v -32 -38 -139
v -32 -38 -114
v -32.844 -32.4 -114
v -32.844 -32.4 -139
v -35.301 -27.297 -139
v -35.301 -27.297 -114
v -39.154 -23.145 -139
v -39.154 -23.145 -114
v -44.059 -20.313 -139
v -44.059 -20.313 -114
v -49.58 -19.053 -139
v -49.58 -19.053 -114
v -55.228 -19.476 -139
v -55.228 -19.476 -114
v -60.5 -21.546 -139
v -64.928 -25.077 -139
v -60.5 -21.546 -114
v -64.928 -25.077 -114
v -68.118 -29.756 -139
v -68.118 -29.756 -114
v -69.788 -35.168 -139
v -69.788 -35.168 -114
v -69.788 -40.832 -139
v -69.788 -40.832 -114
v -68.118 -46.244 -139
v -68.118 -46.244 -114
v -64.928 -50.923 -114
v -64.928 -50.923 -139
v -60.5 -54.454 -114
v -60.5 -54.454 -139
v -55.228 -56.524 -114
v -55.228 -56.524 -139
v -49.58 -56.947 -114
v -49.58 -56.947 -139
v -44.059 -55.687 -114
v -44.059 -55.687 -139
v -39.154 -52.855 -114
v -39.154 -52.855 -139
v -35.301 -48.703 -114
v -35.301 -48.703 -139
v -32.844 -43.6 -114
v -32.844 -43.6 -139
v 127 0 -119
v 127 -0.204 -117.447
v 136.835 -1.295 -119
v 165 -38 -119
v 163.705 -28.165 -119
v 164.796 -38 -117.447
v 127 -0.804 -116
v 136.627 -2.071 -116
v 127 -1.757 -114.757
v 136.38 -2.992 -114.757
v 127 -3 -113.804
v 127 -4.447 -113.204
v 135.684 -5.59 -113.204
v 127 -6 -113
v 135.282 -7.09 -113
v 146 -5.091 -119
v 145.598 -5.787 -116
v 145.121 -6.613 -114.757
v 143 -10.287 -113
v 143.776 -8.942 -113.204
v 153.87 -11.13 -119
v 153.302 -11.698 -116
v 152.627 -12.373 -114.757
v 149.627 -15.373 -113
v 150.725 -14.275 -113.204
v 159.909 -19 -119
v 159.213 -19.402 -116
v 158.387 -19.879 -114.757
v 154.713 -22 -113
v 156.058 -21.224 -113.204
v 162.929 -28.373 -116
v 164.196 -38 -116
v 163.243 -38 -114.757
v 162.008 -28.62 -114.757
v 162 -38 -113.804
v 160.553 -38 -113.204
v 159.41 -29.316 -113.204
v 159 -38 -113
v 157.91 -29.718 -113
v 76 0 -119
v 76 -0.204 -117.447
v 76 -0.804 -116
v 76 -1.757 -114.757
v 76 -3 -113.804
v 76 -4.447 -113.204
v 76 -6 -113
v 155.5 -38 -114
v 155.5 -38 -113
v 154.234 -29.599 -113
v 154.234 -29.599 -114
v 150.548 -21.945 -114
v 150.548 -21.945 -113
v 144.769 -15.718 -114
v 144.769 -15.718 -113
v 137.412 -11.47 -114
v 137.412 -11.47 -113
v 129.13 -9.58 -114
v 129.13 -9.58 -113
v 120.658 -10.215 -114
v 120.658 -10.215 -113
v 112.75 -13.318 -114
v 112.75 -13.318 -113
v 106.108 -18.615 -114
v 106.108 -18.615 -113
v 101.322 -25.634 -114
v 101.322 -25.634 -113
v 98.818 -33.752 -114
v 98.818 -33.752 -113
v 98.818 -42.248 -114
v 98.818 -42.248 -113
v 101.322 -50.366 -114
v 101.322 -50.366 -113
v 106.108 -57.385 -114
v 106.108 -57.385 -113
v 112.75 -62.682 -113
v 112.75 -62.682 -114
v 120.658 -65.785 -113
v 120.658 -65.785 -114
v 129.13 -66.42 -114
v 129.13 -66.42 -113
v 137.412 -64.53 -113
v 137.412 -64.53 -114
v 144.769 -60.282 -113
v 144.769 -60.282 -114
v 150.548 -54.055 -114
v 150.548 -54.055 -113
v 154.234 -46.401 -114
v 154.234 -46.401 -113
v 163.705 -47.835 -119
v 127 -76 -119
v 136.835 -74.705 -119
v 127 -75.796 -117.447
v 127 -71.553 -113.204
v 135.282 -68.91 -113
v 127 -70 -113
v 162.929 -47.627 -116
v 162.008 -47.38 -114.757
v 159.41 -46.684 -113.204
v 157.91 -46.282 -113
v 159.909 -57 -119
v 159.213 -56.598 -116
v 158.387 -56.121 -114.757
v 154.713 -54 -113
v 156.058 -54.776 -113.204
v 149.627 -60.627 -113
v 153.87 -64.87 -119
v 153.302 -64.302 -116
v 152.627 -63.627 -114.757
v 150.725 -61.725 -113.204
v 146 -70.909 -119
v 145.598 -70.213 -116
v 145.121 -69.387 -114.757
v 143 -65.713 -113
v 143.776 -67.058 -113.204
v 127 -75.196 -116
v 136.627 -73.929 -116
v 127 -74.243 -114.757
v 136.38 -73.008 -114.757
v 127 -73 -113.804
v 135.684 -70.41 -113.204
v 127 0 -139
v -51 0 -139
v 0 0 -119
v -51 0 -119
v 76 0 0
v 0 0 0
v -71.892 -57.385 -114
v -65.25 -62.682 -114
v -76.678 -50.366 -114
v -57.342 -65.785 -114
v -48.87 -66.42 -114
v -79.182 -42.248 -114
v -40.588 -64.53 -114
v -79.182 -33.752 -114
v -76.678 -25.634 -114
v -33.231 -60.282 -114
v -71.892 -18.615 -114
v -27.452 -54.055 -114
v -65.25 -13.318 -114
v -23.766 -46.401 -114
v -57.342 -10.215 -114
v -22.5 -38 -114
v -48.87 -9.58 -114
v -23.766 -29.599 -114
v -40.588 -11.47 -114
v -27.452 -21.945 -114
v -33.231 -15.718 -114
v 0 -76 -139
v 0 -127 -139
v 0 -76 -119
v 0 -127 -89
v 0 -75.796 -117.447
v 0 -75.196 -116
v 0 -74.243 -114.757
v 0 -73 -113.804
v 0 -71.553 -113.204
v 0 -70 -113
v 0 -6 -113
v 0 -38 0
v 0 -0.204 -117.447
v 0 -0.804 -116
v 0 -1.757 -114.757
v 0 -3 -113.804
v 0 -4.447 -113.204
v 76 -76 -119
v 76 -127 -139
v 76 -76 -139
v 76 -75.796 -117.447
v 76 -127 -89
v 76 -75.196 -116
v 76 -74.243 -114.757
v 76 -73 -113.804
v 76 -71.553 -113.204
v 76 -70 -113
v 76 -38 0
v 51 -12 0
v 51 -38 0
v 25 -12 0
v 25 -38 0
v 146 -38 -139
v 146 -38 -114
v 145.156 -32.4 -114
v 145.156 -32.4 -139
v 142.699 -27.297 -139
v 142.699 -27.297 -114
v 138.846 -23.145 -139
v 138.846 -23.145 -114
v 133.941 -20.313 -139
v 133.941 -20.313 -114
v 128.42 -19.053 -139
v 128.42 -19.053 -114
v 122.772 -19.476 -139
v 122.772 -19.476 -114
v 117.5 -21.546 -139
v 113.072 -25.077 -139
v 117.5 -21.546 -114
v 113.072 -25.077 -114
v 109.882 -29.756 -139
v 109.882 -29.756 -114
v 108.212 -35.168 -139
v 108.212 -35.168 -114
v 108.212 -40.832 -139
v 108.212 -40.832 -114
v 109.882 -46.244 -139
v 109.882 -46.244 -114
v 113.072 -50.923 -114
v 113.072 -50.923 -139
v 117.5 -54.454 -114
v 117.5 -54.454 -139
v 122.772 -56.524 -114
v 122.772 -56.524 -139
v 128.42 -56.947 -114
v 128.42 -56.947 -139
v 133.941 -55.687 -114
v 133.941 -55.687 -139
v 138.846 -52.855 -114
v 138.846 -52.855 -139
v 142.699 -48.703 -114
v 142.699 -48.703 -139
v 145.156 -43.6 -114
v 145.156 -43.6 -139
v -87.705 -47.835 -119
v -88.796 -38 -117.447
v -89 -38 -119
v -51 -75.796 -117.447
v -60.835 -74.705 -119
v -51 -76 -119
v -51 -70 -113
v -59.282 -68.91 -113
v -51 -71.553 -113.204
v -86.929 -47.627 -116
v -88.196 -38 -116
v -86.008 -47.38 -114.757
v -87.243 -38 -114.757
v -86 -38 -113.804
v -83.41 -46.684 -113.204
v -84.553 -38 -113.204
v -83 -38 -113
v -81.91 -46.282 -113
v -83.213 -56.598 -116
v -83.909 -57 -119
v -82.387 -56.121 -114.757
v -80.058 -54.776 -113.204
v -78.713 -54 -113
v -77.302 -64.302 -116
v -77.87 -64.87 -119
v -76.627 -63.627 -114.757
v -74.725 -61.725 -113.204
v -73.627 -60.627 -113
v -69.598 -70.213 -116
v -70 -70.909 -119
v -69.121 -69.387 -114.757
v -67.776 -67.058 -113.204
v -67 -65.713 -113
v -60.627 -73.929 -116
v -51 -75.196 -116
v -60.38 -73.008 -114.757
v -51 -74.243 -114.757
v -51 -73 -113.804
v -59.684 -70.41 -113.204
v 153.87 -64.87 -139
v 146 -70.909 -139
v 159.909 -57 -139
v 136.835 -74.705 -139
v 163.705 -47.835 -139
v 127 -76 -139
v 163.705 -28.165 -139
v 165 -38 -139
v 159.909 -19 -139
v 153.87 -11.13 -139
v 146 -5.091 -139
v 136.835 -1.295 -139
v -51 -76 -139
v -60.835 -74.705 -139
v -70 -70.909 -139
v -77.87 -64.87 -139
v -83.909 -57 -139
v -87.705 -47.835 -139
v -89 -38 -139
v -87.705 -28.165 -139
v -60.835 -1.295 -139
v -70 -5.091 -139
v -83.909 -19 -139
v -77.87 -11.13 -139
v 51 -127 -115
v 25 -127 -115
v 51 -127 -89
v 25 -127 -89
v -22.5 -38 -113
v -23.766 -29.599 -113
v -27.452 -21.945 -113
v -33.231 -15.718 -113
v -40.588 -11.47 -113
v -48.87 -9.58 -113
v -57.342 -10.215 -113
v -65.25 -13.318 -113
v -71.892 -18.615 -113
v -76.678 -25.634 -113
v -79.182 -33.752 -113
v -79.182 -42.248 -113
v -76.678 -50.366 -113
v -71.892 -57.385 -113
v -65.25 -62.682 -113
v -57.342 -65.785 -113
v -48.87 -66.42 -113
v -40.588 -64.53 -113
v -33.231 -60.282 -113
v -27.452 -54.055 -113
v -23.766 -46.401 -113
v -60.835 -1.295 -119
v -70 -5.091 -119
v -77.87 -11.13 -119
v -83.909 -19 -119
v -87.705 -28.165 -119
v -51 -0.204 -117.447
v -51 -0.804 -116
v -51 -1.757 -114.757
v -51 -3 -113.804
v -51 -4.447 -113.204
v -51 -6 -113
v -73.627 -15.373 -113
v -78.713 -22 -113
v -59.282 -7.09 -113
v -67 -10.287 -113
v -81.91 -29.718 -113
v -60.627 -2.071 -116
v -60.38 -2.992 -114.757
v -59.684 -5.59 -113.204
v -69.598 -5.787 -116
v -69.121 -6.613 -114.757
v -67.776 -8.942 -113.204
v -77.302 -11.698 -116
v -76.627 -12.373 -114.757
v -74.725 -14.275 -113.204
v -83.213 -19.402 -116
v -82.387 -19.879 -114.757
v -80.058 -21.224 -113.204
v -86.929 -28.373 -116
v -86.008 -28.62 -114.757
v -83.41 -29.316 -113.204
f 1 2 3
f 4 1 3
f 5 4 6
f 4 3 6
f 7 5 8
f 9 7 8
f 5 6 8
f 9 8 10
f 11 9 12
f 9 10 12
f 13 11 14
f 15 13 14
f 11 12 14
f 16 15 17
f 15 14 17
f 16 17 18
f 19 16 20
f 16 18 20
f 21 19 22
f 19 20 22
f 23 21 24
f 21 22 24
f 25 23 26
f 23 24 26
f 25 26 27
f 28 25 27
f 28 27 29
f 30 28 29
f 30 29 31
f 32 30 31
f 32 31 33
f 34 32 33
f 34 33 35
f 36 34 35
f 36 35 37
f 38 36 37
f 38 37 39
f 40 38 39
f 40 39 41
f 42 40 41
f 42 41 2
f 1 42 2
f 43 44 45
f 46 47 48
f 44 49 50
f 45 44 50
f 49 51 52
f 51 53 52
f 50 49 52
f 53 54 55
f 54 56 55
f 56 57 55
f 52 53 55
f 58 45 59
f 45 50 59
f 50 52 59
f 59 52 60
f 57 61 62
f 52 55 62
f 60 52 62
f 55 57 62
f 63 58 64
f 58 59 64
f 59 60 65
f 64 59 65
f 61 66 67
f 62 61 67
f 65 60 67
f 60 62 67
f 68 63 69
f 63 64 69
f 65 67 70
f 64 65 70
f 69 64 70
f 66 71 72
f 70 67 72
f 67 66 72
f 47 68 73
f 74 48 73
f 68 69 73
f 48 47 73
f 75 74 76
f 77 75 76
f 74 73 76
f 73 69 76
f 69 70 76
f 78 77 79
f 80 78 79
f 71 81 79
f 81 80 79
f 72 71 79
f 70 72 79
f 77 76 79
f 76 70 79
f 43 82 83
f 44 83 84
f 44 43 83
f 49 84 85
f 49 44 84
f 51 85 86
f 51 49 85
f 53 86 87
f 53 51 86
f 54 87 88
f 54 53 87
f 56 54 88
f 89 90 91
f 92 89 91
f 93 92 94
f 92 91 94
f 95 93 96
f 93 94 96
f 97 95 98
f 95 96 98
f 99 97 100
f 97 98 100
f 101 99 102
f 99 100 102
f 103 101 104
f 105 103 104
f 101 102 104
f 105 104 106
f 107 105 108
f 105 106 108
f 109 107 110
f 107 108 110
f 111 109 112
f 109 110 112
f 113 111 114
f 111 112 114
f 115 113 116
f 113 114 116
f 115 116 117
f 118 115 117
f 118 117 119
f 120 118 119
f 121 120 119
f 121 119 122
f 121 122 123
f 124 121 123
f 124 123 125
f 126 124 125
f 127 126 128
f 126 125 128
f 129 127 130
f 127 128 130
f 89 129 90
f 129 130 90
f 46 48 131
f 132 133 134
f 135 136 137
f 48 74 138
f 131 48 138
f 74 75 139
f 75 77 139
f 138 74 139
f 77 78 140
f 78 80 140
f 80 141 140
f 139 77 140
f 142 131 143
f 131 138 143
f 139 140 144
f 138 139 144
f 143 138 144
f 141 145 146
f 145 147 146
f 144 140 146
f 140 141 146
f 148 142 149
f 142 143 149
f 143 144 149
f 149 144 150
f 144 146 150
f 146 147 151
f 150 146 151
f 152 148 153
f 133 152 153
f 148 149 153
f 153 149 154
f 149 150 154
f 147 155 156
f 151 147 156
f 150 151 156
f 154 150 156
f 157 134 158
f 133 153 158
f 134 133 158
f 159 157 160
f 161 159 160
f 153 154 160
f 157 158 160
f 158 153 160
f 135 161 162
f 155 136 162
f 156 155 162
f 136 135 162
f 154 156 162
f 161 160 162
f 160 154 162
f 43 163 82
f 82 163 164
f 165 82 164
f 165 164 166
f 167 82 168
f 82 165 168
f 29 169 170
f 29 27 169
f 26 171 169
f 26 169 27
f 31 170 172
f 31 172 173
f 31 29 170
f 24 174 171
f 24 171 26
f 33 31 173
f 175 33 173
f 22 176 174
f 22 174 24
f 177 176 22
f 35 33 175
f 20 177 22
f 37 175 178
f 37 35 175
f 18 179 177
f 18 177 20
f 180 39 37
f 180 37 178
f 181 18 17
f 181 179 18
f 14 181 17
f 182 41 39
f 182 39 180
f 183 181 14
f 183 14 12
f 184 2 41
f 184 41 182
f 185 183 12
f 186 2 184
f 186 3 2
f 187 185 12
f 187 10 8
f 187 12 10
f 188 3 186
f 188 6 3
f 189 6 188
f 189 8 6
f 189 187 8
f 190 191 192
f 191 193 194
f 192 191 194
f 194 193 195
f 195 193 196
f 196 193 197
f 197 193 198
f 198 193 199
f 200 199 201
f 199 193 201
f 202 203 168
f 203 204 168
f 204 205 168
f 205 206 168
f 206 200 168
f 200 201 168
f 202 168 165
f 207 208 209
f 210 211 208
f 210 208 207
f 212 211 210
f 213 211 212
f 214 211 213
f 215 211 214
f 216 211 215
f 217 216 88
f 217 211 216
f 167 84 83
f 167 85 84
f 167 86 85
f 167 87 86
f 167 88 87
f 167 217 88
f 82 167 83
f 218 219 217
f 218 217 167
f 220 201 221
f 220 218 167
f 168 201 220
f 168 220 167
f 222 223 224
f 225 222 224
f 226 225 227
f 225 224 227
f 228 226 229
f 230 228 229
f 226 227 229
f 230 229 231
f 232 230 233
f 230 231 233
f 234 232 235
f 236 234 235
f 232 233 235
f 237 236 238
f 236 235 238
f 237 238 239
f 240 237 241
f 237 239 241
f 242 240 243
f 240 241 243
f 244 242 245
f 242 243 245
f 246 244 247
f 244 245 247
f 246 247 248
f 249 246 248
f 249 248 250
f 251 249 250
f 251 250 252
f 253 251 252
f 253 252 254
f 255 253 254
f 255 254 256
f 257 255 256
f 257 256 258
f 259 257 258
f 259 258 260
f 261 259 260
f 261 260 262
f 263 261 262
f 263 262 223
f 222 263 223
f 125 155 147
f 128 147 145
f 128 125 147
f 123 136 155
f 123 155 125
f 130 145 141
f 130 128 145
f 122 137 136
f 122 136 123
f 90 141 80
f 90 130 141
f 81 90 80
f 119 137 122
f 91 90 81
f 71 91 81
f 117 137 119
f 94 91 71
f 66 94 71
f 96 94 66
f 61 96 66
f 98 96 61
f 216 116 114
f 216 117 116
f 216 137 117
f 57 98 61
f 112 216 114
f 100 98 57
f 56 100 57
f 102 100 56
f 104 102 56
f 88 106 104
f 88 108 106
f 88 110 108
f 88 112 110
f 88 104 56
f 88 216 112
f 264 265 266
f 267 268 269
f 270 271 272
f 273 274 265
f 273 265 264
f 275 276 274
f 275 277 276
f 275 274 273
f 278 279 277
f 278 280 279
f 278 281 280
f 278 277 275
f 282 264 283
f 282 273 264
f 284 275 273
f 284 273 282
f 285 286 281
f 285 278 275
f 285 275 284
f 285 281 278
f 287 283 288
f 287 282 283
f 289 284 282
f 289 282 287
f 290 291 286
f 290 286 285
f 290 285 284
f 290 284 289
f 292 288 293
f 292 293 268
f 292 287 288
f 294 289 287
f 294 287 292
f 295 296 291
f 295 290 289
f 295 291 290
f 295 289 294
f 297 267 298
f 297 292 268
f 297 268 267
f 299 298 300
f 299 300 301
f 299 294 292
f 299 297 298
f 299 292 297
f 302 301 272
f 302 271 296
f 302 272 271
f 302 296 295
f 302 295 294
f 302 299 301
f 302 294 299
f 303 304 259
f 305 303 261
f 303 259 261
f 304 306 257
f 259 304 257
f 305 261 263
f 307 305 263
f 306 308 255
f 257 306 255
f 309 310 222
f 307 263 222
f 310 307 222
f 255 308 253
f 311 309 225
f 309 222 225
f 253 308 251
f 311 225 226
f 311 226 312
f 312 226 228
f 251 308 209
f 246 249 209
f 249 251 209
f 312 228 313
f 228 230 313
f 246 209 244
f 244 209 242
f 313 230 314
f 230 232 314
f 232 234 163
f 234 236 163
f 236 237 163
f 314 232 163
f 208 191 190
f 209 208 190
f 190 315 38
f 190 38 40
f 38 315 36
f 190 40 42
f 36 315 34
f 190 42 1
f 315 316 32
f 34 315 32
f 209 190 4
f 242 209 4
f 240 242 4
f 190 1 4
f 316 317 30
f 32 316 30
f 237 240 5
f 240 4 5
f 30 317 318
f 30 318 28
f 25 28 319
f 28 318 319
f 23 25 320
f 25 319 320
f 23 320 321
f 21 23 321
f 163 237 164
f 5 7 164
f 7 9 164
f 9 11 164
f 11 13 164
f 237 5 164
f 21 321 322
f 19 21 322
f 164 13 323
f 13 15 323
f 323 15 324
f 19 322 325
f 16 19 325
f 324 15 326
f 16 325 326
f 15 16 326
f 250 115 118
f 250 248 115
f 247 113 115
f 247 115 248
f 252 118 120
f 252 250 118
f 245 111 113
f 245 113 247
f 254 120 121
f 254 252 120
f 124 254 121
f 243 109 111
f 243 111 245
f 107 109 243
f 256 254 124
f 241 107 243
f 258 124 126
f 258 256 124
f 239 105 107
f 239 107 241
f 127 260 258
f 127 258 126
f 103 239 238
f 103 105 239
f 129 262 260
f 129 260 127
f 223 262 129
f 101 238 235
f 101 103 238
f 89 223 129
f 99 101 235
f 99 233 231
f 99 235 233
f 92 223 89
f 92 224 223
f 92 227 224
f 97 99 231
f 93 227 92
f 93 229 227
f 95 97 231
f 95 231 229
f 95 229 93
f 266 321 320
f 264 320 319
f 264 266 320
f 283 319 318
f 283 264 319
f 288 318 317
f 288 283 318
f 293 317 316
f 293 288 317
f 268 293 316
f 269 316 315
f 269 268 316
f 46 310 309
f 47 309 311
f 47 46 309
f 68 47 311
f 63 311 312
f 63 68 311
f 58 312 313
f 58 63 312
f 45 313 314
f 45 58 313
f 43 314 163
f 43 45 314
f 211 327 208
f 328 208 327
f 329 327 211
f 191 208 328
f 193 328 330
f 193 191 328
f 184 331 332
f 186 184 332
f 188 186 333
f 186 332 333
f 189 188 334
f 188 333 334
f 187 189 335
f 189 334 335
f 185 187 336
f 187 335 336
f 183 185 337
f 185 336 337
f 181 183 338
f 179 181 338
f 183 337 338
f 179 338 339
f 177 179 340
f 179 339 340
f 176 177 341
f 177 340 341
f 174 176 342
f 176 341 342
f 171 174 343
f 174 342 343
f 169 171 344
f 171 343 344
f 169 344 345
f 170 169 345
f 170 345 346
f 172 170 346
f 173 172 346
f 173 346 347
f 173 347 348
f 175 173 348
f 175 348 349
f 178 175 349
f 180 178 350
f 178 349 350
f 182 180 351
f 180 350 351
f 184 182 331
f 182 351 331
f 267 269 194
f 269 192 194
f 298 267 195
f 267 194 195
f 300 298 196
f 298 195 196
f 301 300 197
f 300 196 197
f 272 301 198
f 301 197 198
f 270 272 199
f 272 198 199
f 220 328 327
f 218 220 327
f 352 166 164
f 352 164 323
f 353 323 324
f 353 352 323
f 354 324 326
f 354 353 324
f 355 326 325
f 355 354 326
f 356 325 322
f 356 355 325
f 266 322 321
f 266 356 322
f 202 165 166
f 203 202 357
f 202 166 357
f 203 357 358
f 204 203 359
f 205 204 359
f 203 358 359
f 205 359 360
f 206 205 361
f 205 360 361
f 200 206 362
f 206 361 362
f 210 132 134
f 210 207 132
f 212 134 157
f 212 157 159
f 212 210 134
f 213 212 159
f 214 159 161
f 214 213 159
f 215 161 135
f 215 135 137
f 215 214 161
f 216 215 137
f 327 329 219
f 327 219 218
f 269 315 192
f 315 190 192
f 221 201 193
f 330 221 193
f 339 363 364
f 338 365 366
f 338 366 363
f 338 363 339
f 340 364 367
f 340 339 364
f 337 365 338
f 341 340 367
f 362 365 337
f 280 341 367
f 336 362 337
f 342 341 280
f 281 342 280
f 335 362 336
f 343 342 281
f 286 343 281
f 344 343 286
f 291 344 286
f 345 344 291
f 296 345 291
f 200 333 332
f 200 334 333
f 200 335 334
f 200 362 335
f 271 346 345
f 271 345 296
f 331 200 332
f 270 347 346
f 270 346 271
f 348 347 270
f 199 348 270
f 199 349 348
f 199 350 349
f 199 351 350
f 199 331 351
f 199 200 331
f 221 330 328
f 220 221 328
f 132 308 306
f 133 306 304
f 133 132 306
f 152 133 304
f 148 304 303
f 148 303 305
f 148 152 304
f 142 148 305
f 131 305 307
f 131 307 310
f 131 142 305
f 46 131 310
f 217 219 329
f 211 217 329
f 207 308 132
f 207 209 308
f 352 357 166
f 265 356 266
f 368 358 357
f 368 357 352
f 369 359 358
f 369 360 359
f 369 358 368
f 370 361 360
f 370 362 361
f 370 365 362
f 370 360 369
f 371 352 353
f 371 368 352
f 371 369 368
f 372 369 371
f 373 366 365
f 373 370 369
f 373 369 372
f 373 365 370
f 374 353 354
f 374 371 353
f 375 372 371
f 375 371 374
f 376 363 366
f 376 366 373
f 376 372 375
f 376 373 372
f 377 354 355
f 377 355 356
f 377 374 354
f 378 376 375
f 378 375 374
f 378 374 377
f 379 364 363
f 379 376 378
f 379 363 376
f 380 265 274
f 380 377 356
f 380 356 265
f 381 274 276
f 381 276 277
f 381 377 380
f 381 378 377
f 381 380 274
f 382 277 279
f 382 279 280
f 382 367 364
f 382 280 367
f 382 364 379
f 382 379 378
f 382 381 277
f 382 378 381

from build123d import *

# Parameters (mm, degrees)
F0_W      = 127
F0_H      = 139
F1_DEPTH  = 76
F3_W      = 76
F3_H      = 26
F4_DEPTH  = 51
F2_W      = 76
F2_H      = 26
F5_DEPTH  = 51
F6_DEPTH  = 38
F7_DEPTH  = 38
F8_R      = 19
F9_DEPTH  = 26.001
F10_R     = 37.99999
F11_R     = 28.5
F11_R_2   = 19
F13_DEPTH = 1
F12_R     = 28.5
F12_R_2   = 19
F14_DEPTH = 1
F15_R     = 6
F17_DEPTH = 165.001
F18_W     = 26
F18_H     = 125.8650070512
F21_DEPTH = 18.3847763109
F22_DEPTH = 26.8710576851
F23_DEPTH = 35.3563390593


# Not quite as in the source:
# - a fillet or chamfer is up to 0.001 mm smaller than in the source, because OpenCascade refuses the exact size


with BuildPart() as f1:
    # F0 (on Right) → F1 (new body)
    with BuildSketch(Plane.YZ):
        with Locations((-63.5, -69.5)):
            Rectangle(F0_W, F0_H)
    extrude(amount=F1_DEPTH)

    # F3 (on face) → F4 (join)
    with BuildSketch(Plane.YZ.offset(76)):
        with Locations((-38, -126)):
            Rectangle(F3_W, F3_H)
    extrude(amount=F4_DEPTH)

    # F2 (on face) → F5 (join)
    with BuildSketch(Plane(origin=(0, 0, 0), x_dir=(0, -1, 0), z_dir=(-1, 0, 0))):
        with Locations((38, -126)):
            Rectangle(F2_W, F2_H)
    extrude(amount=F5_DEPTH)

    # F6 (add): a face of the model
    f6_faces = [f1.faces().sort_by_distance(p)[0] for p in [
        (-51, -38, -126),
    ]]
    extrude(f6_faces, amount=F6_DEPTH)

    # F7 (add): a face of the model
    f7_faces = [f1.faces().sort_by_distance(p)[0] for p in [
        (127, -38, -126),
    ]]
    extrude(f7_faces, amount=F7_DEPTH)

    # F8 (on face) → F9 (cut, through all)
    with BuildSketch(Plane.XY.offset(-113)):
        with Locations((-51, -38)):
            Circle(F8_R)
        with Locations((127, -38)):
            Circle(F8_R)
    extrude(amount=-F9_DEPTH, mode=Mode.SUBTRACT)

    # F10 (radius 38 in the source; OpenCascade refuses exactly that, so slightly less here)
    f10_edges = [f1.edges().sort_by_distance(p)[0] for p in [
        (-89, 0, -126),
        (-89, -76, -126),
        (165, -76, -126),
        (165, 0, -126),
    ]]
    fillet(f10_edges, radius=F10_R)

    # F11 (on face) → F13 (cut)
    with BuildSketch(Plane.XY.offset(-113)):
        with Locations((-51, -38)):
            Circle(F11_R)
        with Locations((-51, -38)):
            Circle(F11_R_2, mode=Mode.SUBTRACT)
    extrude(amount=-F13_DEPTH, mode=Mode.SUBTRACT)

    # F12 (on face) → F14 (cut)
    with BuildSketch(Plane.XY.offset(-113)):
        with Locations((127, -38)):
            Circle(F12_R)
        with Locations((127, -38)):
            Circle(F12_R_2, mode=Mode.SUBTRACT)
    extrude(amount=-F14_DEPTH, mode=Mode.SUBTRACT)

    # F15
    f15_edges = [f1.edges().sort_by_distance(p)[0] for p in [
        (-25.500005, -76, -113),
        (-77.870061, -11.129939, -113),
        (101.500005, -76, -113),
    ]]
    fillet(f15_edges, radius=F15_R)

    # F16 (on face) → F17 (cut, through all)
    with BuildSketch(Plane(origin=(0, 0, 0), x_dir=(0, -1, 0), z_dir=(-1, 0, 0))):
        Polygon((127, 0), (38, 0), (127, -89), align=None)
    extrude(amount=-F17_DEPTH, mode=Mode.SUBTRACT)

    # F18 (on face) → F21 (cut, through all)
    with BuildSketch(Plane(origin=(0, -19, 19), x_dir=(1, 0, 0), z_dir=(0, -0.7071067812, 0.7071067812))):
        with Locations((38, -89.8025612107)):
            Rectangle(F18_W, F18_H)
    extrude(amount=-F21_DEPTH, mode=Mode.SUBTRACT)

    # F22 (cut, through all): a face of the model
    f22_faces = [f1.faces().sort_by_distance(p)[0] for p in [
        (38, -31.5, -6.5),
    ]]
    extrude(f22_faces, amount=-F22_DEPTH, mode=Mode.SUBTRACT)

    # F23 (cut, through all): a face of the model
    f23_faces = [f1.faces().sort_by_distance(p)[0] for p in [
        (38, -120.5, -95.5),
    ]]
    extrude(f23_faces, amount=-F23_DEPTH, mode=Mode.SUBTRACT)


solid = f1.part
